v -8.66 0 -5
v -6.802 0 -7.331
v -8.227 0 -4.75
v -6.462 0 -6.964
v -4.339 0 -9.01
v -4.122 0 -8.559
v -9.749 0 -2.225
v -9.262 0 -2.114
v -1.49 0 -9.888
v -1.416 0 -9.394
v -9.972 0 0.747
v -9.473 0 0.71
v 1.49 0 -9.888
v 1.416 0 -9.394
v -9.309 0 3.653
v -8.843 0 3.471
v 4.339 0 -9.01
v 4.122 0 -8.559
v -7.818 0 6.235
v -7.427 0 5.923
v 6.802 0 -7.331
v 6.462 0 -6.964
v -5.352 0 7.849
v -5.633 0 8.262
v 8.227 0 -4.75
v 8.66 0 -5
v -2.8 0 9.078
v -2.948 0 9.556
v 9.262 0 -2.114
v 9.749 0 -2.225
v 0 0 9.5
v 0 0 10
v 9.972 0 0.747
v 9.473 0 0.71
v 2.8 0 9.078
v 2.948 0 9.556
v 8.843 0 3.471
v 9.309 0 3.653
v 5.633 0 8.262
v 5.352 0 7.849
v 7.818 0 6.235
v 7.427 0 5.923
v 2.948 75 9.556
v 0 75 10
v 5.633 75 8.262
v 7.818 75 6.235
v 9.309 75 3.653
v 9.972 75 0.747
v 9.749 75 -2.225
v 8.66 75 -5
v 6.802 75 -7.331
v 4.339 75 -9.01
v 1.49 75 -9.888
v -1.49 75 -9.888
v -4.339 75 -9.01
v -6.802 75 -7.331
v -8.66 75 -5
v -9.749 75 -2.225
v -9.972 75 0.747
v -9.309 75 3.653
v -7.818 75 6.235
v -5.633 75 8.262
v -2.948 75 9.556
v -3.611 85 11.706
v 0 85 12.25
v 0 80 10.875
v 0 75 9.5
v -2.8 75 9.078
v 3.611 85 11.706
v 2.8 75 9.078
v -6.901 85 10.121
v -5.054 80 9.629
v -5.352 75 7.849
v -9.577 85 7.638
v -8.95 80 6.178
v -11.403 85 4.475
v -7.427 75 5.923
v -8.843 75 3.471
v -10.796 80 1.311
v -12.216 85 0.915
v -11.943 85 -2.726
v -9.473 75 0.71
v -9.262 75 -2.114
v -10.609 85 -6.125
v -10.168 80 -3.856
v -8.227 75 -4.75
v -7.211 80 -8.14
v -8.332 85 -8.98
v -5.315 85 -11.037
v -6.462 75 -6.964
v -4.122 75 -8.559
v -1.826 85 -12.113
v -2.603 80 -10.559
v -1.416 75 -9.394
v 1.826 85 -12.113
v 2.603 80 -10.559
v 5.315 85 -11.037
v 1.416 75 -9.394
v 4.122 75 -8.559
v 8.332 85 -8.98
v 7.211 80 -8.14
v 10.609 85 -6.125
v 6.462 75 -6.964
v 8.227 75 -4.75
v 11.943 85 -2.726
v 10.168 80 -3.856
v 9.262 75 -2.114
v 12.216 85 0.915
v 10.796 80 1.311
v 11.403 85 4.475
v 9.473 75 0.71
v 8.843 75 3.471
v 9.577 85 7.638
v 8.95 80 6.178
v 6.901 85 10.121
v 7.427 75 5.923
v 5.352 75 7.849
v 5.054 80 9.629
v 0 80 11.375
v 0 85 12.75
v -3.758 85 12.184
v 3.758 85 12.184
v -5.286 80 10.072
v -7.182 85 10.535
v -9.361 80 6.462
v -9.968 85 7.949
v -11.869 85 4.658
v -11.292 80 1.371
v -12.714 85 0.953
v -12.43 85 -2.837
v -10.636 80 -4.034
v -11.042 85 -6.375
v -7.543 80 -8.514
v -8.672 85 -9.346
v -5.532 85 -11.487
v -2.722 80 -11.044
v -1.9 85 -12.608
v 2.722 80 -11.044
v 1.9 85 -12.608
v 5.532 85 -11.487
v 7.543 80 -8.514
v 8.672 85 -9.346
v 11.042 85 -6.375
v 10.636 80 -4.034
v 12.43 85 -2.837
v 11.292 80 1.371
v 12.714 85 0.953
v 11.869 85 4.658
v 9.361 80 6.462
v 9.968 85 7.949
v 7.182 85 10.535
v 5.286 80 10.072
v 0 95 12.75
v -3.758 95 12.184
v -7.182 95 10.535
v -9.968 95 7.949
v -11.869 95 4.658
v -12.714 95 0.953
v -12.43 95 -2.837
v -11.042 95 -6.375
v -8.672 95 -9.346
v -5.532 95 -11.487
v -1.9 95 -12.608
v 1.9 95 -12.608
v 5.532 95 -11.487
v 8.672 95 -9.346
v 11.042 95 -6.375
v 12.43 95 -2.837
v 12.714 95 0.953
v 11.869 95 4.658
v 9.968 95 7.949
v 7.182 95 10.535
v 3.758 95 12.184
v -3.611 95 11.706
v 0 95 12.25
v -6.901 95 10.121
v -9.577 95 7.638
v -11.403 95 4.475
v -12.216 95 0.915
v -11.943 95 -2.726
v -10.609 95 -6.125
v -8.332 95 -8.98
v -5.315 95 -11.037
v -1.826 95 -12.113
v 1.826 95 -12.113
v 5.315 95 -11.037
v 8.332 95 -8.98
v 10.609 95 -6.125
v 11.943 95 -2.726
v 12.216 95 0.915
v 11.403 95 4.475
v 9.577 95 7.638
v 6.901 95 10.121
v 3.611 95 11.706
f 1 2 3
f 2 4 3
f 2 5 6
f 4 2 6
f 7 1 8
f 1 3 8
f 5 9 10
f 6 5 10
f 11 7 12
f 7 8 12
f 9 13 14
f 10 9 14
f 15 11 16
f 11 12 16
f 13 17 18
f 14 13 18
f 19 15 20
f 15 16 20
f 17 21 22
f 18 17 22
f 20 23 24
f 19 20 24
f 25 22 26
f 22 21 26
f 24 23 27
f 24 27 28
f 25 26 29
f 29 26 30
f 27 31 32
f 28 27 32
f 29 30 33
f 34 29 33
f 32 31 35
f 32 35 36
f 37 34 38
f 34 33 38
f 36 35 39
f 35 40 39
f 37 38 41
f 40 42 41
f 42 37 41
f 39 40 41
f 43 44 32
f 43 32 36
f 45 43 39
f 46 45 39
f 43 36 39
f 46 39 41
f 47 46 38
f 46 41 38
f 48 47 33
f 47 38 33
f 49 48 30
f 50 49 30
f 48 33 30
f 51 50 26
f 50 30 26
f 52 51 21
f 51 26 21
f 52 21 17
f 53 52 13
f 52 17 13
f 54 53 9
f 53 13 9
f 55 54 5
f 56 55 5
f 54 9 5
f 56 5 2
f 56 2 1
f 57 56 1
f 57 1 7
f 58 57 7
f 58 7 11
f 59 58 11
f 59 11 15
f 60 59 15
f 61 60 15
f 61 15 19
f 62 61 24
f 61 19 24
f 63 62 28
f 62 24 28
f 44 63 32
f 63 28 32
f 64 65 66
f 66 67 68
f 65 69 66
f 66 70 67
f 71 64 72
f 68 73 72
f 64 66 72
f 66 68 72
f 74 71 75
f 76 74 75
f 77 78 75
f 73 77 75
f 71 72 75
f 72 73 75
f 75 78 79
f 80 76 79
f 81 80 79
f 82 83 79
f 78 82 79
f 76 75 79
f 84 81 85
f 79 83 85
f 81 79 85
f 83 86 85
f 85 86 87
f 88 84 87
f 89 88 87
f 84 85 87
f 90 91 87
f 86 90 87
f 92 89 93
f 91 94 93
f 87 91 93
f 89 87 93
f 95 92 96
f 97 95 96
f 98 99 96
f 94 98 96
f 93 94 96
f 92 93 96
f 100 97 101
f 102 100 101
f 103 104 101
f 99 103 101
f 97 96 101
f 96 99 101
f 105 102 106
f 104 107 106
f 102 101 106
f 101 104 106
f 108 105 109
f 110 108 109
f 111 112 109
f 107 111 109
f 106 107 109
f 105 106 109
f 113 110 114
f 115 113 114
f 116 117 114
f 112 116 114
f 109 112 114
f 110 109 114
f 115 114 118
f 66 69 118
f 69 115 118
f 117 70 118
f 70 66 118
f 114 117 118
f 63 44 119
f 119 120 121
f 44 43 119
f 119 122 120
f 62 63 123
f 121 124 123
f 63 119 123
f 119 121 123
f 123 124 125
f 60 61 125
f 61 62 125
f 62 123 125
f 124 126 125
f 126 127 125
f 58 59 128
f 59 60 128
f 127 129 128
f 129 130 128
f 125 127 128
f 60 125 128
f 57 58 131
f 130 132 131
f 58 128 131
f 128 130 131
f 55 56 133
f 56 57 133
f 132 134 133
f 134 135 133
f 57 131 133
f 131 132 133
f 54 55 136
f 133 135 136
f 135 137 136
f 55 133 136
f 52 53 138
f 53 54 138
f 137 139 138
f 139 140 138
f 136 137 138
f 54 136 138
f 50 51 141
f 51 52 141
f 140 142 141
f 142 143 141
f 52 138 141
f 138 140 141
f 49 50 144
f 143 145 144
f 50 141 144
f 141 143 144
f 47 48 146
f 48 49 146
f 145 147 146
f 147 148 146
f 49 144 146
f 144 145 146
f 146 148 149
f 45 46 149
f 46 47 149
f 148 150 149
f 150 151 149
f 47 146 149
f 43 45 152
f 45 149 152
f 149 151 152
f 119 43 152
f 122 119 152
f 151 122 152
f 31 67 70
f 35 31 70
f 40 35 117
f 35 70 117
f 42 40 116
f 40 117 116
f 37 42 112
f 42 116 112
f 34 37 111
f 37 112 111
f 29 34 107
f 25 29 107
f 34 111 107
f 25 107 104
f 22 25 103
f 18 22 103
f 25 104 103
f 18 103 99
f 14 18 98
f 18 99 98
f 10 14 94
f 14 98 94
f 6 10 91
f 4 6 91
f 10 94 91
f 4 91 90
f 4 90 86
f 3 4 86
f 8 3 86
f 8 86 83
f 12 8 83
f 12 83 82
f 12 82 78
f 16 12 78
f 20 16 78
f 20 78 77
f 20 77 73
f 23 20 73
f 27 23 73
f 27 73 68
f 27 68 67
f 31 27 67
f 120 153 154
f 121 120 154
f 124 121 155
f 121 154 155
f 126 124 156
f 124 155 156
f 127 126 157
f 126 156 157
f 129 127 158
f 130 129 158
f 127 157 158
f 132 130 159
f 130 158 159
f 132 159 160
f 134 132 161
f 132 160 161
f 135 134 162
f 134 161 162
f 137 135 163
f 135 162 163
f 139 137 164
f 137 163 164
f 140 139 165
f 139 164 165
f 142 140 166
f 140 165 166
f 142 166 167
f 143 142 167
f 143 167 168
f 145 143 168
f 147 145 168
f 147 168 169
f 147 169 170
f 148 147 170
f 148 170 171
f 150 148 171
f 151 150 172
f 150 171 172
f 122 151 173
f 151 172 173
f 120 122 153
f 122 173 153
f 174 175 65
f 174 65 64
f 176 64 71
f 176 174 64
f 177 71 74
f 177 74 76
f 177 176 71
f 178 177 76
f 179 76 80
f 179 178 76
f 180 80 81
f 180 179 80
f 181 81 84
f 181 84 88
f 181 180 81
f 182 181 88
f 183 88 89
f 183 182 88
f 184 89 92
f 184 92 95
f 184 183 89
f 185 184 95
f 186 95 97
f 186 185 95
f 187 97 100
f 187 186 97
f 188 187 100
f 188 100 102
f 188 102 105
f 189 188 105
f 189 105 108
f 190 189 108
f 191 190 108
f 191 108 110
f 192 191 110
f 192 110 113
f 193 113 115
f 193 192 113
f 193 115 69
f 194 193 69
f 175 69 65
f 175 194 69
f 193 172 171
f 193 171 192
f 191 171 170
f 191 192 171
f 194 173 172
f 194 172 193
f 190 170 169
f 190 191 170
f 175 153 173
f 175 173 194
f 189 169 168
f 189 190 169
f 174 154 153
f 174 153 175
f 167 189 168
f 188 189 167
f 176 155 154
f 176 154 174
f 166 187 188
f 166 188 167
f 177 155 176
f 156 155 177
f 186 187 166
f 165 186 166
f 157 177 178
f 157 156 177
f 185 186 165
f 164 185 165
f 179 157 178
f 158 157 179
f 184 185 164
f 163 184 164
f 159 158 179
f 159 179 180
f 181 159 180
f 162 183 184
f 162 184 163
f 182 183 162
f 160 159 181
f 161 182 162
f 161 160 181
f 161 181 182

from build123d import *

# Parameters (mm, degrees)
SKETCH1_R           = 10
BOSS_EXTRUDE1_DEPTH = 75
SKETCH2_R           = 9.5
CUT_EXTRUDE1_DEPTH  = 77.321687612
SKETCH4_W           = 0.5
SKETCH4_H           = 10


with BuildPart() as part:
    # Sketch1 → Boss-Extrude1 (new body)
    with BuildSketch(Plane(origin=(0, 0, 0), x_dir=(1, 0, 0), z_dir=(0, 1, 0))):
        with Locations(Location((0, 0, 0), (0, 0, 270))):
            Circle(SKETCH1_R)
    extrude(amount=BOSS_EXTRUDE1_DEPTH)

    # Sketch2 → Cut-Extrude1 (cut, through all)
    with BuildSketch(Plane(origin=(0, 75, 0), x_dir=(1, 0, 0), z_dir=(0, 1, 0))):
        with Locations(Location((0, 0, 0), (0, 0, 270))):
            Circle(SKETCH2_R)
    extrude(amount=-CUT_EXTRUDE1_DEPTH, mode=Mode.SUBTRACT)

    # Sketch3 → Revolve1 (revolve)
    with BuildSketch(Plane(origin=(0, 0, 0), x_dir=(0, 0, -1), z_dir=(1, 0, 0)), mode=Mode.PRIVATE) as revolve1_sk:
        Polygon((10, 75), (12.75, 85), (12.25, 85), (9.5, 75), align=None)
    revolve(revolve1_sk.sketch.rotate(Axis((0, 75, 0), (0, -1, 0)), 180), axis=Axis((0, 75, 0), (0, -1, 0)))

    # Sketch4 → Revolve2 (revolve)
    with BuildSketch(Plane(origin=(0, 0, 0), x_dir=(0, 0, -1), z_dir=(1, 0, 0)), mode=Mode.PRIVATE) as revolve2_sk:
        with Locations((12.5, 90)):
            Rectangle(SKETCH4_W, SKETCH4_H)
    revolve(revolve2_sk.sketch.rotate(Axis((0, 75, 0), (0, -1, 0)), 180), axis=Axis((0, 75, 0), (0, -1, 0)))


solid = part.part
